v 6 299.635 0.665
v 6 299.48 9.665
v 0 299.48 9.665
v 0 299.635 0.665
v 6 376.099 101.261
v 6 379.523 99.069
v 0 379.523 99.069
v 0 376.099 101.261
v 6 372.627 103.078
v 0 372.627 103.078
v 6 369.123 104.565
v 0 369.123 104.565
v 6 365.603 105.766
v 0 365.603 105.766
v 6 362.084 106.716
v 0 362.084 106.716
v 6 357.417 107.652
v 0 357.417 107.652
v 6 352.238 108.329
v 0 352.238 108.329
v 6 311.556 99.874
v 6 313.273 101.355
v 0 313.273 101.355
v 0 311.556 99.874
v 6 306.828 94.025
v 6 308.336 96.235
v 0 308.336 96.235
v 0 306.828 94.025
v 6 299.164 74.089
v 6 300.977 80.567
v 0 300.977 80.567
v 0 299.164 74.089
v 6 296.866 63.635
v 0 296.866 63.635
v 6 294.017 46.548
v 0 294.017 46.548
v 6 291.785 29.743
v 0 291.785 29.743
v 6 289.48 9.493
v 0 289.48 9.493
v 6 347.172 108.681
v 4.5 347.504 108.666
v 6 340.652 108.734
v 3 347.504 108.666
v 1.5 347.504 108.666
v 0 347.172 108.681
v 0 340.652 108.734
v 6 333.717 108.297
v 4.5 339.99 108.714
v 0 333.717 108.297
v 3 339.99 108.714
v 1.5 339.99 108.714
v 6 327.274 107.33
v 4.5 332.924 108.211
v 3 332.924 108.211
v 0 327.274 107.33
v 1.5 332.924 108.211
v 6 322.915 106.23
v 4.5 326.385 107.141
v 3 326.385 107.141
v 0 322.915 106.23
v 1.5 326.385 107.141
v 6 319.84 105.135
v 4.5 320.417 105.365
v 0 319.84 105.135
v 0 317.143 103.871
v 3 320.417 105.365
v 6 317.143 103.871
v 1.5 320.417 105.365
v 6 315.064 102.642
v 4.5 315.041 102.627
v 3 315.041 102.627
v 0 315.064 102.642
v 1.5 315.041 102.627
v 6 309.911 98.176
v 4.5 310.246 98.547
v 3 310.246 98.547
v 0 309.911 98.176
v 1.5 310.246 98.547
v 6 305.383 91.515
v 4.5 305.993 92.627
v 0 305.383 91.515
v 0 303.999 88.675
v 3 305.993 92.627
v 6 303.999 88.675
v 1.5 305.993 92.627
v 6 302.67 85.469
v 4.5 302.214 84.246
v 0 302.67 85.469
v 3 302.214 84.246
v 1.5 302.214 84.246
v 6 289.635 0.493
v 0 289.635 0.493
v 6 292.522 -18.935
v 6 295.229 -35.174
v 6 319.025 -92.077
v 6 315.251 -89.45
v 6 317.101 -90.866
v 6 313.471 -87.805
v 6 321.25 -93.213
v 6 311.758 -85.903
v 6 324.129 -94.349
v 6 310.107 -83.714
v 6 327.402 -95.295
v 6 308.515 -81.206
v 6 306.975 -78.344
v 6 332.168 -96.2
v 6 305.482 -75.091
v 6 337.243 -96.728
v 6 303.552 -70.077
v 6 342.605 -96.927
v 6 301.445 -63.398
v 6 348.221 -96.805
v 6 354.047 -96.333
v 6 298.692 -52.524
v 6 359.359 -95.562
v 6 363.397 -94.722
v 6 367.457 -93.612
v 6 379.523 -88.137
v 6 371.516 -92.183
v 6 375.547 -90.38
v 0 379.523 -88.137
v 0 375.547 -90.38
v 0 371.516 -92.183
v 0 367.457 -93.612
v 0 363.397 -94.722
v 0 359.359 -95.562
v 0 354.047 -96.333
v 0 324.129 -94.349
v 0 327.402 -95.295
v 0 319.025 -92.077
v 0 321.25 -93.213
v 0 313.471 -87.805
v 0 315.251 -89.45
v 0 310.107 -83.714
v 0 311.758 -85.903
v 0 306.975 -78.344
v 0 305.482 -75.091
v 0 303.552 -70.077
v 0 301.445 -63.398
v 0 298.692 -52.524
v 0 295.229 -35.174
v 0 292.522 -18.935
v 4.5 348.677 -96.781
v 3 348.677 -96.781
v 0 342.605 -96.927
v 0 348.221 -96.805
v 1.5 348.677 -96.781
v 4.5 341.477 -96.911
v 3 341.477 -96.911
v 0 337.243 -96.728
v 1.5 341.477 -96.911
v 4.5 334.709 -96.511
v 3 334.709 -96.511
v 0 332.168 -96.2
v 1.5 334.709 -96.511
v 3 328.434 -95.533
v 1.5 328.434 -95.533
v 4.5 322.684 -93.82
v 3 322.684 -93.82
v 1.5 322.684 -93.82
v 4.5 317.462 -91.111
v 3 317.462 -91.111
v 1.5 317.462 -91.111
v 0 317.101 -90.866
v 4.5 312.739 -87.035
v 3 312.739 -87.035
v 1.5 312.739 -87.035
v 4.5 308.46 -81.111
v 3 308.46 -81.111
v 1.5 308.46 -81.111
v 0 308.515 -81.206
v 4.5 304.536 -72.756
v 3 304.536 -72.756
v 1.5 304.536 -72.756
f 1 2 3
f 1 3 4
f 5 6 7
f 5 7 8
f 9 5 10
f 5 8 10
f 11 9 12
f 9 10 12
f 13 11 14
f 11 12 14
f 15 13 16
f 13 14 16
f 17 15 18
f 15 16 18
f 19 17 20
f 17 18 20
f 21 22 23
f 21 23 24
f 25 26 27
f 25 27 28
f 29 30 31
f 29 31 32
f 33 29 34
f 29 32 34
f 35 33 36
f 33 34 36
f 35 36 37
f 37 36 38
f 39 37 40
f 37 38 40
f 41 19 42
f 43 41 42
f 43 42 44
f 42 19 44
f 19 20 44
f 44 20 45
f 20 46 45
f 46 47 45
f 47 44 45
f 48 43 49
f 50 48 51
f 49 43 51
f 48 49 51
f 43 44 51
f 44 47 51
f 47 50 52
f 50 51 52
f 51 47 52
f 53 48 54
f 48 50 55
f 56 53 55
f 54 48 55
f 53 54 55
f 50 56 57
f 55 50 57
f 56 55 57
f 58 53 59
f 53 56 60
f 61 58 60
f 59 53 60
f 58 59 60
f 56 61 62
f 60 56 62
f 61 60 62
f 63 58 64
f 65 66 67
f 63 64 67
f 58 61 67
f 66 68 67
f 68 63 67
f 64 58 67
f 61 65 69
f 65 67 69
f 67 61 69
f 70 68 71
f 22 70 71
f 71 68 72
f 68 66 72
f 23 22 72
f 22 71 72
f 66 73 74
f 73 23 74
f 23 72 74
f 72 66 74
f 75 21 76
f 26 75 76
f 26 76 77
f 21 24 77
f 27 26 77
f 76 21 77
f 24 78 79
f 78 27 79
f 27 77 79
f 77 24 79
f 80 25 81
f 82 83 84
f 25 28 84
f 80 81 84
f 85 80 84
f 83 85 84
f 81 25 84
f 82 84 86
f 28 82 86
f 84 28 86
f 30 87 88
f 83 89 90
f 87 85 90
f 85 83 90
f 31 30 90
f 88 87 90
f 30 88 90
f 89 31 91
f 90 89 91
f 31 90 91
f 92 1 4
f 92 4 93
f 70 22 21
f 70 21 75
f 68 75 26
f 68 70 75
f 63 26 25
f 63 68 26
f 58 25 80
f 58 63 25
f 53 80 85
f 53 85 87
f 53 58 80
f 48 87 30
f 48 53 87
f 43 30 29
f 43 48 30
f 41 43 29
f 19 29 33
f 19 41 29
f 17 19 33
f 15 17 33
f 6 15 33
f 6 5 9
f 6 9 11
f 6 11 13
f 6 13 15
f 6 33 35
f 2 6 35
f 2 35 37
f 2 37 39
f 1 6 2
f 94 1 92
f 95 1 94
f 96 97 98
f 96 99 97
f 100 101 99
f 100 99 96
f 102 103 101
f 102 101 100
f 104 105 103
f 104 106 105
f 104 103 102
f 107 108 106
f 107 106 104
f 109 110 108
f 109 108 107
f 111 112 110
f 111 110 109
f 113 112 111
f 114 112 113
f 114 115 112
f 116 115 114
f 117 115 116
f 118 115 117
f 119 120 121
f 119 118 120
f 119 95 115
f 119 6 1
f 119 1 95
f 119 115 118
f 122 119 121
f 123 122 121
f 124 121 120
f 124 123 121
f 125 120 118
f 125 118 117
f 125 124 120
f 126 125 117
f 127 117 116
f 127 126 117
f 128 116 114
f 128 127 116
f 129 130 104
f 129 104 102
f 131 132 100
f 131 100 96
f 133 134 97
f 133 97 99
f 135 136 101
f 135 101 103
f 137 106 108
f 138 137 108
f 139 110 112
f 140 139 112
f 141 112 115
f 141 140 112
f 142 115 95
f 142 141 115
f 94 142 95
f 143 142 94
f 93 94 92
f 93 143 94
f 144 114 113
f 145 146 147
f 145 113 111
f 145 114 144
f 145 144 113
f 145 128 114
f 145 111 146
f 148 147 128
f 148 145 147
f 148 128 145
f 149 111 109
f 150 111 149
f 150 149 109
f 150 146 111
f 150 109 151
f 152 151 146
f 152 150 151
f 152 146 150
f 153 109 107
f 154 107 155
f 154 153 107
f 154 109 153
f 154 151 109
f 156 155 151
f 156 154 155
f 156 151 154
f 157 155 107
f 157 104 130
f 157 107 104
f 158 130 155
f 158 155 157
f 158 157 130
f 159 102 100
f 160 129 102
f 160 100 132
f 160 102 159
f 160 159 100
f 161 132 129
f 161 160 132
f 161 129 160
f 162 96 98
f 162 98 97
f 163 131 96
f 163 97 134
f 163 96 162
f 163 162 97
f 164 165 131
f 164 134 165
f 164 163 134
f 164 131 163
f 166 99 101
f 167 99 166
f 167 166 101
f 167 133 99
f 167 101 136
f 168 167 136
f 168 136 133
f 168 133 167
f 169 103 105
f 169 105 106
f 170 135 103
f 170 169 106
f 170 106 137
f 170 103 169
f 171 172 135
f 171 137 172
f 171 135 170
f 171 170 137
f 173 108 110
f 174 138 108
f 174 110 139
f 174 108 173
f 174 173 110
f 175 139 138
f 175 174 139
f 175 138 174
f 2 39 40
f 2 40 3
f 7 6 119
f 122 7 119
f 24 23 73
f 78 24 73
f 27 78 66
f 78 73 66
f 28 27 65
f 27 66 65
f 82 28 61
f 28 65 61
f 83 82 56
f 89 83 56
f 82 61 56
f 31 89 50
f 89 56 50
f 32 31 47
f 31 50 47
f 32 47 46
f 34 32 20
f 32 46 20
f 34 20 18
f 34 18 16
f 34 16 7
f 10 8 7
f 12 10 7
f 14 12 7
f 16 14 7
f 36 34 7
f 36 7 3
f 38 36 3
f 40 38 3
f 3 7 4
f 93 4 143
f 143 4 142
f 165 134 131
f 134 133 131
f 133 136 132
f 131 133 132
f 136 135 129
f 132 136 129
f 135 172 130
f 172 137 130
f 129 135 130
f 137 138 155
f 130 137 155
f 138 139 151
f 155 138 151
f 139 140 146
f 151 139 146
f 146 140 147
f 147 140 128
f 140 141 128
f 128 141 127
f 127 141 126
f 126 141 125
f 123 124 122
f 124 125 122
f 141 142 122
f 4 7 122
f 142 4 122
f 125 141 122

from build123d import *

# Parameters (mm, degrees)
BOSS_EXTRU_3_DEPTH      = 6
ENL_V_MAT_EXTRU_1_DEPTH = 6
ESQUISSE4_W             = 218.43509427
ESQUISSE4_H             = 33.522217437
ENL_V_MAT_EXTRU_2_DEPTH = 6


with BuildPart() as part:
    # Esquisse2 → Boss.-Extru.3 (new body)
    with BuildSketch(Plane(origin=(0, 0, 0), x_dir=(0, 0, -1), z_dir=(1, 0, 0))):
        with BuildLine():
            add(Edge.make_bspline(
                [(-7.065100079, 409.751237327), (-183.045107551, 403.249389946), (-48.294946403, 311.918725168), (-176.058062158, 306.927978459), (-4.983099793, 289.002460423)],
                knots=[0, 0, 0, 0, 0, 1, 1, 1, 1, 1], degree=4))
            add(Edge.make_bspline(
                [(-7.065100079, 409.751237327), (169.034448932, 409.320091083), (37.512972649, 313.398260751), (165.372196707, 312.815060008), (-4.983099793, 289.002460423)],
                knots=[0, 0, 0, 0, 0, 1, 1, 1, 1, 1], degree=4))
        make_face()
    extrude(amount=BOSS_EXTRU_3_DEPTH)

    # Esquisse3 → Enlèv. mat.-Extru.1 (cut)
    with BuildSketch(Plane(origin=(6, 0, 0), x_dir=(0, 0, -1), z_dir=(1, 0, 0))):
        Polygon((-9.492671401, 289.479989494), (-9.665095531, 299.479989494), (-0.665095531, 299.635171212), (-0.492671401, 289.635171212), (1.759983212, 274.106938881), (-11.796326648, 270.185646644), align=None)
    extrude(amount=-ENL_V_MAT_EXTRU_1_DEPTH, mode=Mode.SUBTRACT)

    # Esquisse4 → Enlèv. mat.-Extru.2 (cut)
    with BuildSketch(Plane(origin=(6, 0, 0), x_dir=(0, 0, -1), z_dir=(1, 0, 0))):
        with Locations((0.96996454, 396.283979233)):
            Rectangle(ESQUISSE4_W, ESQUISSE4_H)
    extrude(amount=-ENL_V_MAT_EXTRU_2_DEPTH, mode=Mode.SUBTRACT)


solid = part.part
